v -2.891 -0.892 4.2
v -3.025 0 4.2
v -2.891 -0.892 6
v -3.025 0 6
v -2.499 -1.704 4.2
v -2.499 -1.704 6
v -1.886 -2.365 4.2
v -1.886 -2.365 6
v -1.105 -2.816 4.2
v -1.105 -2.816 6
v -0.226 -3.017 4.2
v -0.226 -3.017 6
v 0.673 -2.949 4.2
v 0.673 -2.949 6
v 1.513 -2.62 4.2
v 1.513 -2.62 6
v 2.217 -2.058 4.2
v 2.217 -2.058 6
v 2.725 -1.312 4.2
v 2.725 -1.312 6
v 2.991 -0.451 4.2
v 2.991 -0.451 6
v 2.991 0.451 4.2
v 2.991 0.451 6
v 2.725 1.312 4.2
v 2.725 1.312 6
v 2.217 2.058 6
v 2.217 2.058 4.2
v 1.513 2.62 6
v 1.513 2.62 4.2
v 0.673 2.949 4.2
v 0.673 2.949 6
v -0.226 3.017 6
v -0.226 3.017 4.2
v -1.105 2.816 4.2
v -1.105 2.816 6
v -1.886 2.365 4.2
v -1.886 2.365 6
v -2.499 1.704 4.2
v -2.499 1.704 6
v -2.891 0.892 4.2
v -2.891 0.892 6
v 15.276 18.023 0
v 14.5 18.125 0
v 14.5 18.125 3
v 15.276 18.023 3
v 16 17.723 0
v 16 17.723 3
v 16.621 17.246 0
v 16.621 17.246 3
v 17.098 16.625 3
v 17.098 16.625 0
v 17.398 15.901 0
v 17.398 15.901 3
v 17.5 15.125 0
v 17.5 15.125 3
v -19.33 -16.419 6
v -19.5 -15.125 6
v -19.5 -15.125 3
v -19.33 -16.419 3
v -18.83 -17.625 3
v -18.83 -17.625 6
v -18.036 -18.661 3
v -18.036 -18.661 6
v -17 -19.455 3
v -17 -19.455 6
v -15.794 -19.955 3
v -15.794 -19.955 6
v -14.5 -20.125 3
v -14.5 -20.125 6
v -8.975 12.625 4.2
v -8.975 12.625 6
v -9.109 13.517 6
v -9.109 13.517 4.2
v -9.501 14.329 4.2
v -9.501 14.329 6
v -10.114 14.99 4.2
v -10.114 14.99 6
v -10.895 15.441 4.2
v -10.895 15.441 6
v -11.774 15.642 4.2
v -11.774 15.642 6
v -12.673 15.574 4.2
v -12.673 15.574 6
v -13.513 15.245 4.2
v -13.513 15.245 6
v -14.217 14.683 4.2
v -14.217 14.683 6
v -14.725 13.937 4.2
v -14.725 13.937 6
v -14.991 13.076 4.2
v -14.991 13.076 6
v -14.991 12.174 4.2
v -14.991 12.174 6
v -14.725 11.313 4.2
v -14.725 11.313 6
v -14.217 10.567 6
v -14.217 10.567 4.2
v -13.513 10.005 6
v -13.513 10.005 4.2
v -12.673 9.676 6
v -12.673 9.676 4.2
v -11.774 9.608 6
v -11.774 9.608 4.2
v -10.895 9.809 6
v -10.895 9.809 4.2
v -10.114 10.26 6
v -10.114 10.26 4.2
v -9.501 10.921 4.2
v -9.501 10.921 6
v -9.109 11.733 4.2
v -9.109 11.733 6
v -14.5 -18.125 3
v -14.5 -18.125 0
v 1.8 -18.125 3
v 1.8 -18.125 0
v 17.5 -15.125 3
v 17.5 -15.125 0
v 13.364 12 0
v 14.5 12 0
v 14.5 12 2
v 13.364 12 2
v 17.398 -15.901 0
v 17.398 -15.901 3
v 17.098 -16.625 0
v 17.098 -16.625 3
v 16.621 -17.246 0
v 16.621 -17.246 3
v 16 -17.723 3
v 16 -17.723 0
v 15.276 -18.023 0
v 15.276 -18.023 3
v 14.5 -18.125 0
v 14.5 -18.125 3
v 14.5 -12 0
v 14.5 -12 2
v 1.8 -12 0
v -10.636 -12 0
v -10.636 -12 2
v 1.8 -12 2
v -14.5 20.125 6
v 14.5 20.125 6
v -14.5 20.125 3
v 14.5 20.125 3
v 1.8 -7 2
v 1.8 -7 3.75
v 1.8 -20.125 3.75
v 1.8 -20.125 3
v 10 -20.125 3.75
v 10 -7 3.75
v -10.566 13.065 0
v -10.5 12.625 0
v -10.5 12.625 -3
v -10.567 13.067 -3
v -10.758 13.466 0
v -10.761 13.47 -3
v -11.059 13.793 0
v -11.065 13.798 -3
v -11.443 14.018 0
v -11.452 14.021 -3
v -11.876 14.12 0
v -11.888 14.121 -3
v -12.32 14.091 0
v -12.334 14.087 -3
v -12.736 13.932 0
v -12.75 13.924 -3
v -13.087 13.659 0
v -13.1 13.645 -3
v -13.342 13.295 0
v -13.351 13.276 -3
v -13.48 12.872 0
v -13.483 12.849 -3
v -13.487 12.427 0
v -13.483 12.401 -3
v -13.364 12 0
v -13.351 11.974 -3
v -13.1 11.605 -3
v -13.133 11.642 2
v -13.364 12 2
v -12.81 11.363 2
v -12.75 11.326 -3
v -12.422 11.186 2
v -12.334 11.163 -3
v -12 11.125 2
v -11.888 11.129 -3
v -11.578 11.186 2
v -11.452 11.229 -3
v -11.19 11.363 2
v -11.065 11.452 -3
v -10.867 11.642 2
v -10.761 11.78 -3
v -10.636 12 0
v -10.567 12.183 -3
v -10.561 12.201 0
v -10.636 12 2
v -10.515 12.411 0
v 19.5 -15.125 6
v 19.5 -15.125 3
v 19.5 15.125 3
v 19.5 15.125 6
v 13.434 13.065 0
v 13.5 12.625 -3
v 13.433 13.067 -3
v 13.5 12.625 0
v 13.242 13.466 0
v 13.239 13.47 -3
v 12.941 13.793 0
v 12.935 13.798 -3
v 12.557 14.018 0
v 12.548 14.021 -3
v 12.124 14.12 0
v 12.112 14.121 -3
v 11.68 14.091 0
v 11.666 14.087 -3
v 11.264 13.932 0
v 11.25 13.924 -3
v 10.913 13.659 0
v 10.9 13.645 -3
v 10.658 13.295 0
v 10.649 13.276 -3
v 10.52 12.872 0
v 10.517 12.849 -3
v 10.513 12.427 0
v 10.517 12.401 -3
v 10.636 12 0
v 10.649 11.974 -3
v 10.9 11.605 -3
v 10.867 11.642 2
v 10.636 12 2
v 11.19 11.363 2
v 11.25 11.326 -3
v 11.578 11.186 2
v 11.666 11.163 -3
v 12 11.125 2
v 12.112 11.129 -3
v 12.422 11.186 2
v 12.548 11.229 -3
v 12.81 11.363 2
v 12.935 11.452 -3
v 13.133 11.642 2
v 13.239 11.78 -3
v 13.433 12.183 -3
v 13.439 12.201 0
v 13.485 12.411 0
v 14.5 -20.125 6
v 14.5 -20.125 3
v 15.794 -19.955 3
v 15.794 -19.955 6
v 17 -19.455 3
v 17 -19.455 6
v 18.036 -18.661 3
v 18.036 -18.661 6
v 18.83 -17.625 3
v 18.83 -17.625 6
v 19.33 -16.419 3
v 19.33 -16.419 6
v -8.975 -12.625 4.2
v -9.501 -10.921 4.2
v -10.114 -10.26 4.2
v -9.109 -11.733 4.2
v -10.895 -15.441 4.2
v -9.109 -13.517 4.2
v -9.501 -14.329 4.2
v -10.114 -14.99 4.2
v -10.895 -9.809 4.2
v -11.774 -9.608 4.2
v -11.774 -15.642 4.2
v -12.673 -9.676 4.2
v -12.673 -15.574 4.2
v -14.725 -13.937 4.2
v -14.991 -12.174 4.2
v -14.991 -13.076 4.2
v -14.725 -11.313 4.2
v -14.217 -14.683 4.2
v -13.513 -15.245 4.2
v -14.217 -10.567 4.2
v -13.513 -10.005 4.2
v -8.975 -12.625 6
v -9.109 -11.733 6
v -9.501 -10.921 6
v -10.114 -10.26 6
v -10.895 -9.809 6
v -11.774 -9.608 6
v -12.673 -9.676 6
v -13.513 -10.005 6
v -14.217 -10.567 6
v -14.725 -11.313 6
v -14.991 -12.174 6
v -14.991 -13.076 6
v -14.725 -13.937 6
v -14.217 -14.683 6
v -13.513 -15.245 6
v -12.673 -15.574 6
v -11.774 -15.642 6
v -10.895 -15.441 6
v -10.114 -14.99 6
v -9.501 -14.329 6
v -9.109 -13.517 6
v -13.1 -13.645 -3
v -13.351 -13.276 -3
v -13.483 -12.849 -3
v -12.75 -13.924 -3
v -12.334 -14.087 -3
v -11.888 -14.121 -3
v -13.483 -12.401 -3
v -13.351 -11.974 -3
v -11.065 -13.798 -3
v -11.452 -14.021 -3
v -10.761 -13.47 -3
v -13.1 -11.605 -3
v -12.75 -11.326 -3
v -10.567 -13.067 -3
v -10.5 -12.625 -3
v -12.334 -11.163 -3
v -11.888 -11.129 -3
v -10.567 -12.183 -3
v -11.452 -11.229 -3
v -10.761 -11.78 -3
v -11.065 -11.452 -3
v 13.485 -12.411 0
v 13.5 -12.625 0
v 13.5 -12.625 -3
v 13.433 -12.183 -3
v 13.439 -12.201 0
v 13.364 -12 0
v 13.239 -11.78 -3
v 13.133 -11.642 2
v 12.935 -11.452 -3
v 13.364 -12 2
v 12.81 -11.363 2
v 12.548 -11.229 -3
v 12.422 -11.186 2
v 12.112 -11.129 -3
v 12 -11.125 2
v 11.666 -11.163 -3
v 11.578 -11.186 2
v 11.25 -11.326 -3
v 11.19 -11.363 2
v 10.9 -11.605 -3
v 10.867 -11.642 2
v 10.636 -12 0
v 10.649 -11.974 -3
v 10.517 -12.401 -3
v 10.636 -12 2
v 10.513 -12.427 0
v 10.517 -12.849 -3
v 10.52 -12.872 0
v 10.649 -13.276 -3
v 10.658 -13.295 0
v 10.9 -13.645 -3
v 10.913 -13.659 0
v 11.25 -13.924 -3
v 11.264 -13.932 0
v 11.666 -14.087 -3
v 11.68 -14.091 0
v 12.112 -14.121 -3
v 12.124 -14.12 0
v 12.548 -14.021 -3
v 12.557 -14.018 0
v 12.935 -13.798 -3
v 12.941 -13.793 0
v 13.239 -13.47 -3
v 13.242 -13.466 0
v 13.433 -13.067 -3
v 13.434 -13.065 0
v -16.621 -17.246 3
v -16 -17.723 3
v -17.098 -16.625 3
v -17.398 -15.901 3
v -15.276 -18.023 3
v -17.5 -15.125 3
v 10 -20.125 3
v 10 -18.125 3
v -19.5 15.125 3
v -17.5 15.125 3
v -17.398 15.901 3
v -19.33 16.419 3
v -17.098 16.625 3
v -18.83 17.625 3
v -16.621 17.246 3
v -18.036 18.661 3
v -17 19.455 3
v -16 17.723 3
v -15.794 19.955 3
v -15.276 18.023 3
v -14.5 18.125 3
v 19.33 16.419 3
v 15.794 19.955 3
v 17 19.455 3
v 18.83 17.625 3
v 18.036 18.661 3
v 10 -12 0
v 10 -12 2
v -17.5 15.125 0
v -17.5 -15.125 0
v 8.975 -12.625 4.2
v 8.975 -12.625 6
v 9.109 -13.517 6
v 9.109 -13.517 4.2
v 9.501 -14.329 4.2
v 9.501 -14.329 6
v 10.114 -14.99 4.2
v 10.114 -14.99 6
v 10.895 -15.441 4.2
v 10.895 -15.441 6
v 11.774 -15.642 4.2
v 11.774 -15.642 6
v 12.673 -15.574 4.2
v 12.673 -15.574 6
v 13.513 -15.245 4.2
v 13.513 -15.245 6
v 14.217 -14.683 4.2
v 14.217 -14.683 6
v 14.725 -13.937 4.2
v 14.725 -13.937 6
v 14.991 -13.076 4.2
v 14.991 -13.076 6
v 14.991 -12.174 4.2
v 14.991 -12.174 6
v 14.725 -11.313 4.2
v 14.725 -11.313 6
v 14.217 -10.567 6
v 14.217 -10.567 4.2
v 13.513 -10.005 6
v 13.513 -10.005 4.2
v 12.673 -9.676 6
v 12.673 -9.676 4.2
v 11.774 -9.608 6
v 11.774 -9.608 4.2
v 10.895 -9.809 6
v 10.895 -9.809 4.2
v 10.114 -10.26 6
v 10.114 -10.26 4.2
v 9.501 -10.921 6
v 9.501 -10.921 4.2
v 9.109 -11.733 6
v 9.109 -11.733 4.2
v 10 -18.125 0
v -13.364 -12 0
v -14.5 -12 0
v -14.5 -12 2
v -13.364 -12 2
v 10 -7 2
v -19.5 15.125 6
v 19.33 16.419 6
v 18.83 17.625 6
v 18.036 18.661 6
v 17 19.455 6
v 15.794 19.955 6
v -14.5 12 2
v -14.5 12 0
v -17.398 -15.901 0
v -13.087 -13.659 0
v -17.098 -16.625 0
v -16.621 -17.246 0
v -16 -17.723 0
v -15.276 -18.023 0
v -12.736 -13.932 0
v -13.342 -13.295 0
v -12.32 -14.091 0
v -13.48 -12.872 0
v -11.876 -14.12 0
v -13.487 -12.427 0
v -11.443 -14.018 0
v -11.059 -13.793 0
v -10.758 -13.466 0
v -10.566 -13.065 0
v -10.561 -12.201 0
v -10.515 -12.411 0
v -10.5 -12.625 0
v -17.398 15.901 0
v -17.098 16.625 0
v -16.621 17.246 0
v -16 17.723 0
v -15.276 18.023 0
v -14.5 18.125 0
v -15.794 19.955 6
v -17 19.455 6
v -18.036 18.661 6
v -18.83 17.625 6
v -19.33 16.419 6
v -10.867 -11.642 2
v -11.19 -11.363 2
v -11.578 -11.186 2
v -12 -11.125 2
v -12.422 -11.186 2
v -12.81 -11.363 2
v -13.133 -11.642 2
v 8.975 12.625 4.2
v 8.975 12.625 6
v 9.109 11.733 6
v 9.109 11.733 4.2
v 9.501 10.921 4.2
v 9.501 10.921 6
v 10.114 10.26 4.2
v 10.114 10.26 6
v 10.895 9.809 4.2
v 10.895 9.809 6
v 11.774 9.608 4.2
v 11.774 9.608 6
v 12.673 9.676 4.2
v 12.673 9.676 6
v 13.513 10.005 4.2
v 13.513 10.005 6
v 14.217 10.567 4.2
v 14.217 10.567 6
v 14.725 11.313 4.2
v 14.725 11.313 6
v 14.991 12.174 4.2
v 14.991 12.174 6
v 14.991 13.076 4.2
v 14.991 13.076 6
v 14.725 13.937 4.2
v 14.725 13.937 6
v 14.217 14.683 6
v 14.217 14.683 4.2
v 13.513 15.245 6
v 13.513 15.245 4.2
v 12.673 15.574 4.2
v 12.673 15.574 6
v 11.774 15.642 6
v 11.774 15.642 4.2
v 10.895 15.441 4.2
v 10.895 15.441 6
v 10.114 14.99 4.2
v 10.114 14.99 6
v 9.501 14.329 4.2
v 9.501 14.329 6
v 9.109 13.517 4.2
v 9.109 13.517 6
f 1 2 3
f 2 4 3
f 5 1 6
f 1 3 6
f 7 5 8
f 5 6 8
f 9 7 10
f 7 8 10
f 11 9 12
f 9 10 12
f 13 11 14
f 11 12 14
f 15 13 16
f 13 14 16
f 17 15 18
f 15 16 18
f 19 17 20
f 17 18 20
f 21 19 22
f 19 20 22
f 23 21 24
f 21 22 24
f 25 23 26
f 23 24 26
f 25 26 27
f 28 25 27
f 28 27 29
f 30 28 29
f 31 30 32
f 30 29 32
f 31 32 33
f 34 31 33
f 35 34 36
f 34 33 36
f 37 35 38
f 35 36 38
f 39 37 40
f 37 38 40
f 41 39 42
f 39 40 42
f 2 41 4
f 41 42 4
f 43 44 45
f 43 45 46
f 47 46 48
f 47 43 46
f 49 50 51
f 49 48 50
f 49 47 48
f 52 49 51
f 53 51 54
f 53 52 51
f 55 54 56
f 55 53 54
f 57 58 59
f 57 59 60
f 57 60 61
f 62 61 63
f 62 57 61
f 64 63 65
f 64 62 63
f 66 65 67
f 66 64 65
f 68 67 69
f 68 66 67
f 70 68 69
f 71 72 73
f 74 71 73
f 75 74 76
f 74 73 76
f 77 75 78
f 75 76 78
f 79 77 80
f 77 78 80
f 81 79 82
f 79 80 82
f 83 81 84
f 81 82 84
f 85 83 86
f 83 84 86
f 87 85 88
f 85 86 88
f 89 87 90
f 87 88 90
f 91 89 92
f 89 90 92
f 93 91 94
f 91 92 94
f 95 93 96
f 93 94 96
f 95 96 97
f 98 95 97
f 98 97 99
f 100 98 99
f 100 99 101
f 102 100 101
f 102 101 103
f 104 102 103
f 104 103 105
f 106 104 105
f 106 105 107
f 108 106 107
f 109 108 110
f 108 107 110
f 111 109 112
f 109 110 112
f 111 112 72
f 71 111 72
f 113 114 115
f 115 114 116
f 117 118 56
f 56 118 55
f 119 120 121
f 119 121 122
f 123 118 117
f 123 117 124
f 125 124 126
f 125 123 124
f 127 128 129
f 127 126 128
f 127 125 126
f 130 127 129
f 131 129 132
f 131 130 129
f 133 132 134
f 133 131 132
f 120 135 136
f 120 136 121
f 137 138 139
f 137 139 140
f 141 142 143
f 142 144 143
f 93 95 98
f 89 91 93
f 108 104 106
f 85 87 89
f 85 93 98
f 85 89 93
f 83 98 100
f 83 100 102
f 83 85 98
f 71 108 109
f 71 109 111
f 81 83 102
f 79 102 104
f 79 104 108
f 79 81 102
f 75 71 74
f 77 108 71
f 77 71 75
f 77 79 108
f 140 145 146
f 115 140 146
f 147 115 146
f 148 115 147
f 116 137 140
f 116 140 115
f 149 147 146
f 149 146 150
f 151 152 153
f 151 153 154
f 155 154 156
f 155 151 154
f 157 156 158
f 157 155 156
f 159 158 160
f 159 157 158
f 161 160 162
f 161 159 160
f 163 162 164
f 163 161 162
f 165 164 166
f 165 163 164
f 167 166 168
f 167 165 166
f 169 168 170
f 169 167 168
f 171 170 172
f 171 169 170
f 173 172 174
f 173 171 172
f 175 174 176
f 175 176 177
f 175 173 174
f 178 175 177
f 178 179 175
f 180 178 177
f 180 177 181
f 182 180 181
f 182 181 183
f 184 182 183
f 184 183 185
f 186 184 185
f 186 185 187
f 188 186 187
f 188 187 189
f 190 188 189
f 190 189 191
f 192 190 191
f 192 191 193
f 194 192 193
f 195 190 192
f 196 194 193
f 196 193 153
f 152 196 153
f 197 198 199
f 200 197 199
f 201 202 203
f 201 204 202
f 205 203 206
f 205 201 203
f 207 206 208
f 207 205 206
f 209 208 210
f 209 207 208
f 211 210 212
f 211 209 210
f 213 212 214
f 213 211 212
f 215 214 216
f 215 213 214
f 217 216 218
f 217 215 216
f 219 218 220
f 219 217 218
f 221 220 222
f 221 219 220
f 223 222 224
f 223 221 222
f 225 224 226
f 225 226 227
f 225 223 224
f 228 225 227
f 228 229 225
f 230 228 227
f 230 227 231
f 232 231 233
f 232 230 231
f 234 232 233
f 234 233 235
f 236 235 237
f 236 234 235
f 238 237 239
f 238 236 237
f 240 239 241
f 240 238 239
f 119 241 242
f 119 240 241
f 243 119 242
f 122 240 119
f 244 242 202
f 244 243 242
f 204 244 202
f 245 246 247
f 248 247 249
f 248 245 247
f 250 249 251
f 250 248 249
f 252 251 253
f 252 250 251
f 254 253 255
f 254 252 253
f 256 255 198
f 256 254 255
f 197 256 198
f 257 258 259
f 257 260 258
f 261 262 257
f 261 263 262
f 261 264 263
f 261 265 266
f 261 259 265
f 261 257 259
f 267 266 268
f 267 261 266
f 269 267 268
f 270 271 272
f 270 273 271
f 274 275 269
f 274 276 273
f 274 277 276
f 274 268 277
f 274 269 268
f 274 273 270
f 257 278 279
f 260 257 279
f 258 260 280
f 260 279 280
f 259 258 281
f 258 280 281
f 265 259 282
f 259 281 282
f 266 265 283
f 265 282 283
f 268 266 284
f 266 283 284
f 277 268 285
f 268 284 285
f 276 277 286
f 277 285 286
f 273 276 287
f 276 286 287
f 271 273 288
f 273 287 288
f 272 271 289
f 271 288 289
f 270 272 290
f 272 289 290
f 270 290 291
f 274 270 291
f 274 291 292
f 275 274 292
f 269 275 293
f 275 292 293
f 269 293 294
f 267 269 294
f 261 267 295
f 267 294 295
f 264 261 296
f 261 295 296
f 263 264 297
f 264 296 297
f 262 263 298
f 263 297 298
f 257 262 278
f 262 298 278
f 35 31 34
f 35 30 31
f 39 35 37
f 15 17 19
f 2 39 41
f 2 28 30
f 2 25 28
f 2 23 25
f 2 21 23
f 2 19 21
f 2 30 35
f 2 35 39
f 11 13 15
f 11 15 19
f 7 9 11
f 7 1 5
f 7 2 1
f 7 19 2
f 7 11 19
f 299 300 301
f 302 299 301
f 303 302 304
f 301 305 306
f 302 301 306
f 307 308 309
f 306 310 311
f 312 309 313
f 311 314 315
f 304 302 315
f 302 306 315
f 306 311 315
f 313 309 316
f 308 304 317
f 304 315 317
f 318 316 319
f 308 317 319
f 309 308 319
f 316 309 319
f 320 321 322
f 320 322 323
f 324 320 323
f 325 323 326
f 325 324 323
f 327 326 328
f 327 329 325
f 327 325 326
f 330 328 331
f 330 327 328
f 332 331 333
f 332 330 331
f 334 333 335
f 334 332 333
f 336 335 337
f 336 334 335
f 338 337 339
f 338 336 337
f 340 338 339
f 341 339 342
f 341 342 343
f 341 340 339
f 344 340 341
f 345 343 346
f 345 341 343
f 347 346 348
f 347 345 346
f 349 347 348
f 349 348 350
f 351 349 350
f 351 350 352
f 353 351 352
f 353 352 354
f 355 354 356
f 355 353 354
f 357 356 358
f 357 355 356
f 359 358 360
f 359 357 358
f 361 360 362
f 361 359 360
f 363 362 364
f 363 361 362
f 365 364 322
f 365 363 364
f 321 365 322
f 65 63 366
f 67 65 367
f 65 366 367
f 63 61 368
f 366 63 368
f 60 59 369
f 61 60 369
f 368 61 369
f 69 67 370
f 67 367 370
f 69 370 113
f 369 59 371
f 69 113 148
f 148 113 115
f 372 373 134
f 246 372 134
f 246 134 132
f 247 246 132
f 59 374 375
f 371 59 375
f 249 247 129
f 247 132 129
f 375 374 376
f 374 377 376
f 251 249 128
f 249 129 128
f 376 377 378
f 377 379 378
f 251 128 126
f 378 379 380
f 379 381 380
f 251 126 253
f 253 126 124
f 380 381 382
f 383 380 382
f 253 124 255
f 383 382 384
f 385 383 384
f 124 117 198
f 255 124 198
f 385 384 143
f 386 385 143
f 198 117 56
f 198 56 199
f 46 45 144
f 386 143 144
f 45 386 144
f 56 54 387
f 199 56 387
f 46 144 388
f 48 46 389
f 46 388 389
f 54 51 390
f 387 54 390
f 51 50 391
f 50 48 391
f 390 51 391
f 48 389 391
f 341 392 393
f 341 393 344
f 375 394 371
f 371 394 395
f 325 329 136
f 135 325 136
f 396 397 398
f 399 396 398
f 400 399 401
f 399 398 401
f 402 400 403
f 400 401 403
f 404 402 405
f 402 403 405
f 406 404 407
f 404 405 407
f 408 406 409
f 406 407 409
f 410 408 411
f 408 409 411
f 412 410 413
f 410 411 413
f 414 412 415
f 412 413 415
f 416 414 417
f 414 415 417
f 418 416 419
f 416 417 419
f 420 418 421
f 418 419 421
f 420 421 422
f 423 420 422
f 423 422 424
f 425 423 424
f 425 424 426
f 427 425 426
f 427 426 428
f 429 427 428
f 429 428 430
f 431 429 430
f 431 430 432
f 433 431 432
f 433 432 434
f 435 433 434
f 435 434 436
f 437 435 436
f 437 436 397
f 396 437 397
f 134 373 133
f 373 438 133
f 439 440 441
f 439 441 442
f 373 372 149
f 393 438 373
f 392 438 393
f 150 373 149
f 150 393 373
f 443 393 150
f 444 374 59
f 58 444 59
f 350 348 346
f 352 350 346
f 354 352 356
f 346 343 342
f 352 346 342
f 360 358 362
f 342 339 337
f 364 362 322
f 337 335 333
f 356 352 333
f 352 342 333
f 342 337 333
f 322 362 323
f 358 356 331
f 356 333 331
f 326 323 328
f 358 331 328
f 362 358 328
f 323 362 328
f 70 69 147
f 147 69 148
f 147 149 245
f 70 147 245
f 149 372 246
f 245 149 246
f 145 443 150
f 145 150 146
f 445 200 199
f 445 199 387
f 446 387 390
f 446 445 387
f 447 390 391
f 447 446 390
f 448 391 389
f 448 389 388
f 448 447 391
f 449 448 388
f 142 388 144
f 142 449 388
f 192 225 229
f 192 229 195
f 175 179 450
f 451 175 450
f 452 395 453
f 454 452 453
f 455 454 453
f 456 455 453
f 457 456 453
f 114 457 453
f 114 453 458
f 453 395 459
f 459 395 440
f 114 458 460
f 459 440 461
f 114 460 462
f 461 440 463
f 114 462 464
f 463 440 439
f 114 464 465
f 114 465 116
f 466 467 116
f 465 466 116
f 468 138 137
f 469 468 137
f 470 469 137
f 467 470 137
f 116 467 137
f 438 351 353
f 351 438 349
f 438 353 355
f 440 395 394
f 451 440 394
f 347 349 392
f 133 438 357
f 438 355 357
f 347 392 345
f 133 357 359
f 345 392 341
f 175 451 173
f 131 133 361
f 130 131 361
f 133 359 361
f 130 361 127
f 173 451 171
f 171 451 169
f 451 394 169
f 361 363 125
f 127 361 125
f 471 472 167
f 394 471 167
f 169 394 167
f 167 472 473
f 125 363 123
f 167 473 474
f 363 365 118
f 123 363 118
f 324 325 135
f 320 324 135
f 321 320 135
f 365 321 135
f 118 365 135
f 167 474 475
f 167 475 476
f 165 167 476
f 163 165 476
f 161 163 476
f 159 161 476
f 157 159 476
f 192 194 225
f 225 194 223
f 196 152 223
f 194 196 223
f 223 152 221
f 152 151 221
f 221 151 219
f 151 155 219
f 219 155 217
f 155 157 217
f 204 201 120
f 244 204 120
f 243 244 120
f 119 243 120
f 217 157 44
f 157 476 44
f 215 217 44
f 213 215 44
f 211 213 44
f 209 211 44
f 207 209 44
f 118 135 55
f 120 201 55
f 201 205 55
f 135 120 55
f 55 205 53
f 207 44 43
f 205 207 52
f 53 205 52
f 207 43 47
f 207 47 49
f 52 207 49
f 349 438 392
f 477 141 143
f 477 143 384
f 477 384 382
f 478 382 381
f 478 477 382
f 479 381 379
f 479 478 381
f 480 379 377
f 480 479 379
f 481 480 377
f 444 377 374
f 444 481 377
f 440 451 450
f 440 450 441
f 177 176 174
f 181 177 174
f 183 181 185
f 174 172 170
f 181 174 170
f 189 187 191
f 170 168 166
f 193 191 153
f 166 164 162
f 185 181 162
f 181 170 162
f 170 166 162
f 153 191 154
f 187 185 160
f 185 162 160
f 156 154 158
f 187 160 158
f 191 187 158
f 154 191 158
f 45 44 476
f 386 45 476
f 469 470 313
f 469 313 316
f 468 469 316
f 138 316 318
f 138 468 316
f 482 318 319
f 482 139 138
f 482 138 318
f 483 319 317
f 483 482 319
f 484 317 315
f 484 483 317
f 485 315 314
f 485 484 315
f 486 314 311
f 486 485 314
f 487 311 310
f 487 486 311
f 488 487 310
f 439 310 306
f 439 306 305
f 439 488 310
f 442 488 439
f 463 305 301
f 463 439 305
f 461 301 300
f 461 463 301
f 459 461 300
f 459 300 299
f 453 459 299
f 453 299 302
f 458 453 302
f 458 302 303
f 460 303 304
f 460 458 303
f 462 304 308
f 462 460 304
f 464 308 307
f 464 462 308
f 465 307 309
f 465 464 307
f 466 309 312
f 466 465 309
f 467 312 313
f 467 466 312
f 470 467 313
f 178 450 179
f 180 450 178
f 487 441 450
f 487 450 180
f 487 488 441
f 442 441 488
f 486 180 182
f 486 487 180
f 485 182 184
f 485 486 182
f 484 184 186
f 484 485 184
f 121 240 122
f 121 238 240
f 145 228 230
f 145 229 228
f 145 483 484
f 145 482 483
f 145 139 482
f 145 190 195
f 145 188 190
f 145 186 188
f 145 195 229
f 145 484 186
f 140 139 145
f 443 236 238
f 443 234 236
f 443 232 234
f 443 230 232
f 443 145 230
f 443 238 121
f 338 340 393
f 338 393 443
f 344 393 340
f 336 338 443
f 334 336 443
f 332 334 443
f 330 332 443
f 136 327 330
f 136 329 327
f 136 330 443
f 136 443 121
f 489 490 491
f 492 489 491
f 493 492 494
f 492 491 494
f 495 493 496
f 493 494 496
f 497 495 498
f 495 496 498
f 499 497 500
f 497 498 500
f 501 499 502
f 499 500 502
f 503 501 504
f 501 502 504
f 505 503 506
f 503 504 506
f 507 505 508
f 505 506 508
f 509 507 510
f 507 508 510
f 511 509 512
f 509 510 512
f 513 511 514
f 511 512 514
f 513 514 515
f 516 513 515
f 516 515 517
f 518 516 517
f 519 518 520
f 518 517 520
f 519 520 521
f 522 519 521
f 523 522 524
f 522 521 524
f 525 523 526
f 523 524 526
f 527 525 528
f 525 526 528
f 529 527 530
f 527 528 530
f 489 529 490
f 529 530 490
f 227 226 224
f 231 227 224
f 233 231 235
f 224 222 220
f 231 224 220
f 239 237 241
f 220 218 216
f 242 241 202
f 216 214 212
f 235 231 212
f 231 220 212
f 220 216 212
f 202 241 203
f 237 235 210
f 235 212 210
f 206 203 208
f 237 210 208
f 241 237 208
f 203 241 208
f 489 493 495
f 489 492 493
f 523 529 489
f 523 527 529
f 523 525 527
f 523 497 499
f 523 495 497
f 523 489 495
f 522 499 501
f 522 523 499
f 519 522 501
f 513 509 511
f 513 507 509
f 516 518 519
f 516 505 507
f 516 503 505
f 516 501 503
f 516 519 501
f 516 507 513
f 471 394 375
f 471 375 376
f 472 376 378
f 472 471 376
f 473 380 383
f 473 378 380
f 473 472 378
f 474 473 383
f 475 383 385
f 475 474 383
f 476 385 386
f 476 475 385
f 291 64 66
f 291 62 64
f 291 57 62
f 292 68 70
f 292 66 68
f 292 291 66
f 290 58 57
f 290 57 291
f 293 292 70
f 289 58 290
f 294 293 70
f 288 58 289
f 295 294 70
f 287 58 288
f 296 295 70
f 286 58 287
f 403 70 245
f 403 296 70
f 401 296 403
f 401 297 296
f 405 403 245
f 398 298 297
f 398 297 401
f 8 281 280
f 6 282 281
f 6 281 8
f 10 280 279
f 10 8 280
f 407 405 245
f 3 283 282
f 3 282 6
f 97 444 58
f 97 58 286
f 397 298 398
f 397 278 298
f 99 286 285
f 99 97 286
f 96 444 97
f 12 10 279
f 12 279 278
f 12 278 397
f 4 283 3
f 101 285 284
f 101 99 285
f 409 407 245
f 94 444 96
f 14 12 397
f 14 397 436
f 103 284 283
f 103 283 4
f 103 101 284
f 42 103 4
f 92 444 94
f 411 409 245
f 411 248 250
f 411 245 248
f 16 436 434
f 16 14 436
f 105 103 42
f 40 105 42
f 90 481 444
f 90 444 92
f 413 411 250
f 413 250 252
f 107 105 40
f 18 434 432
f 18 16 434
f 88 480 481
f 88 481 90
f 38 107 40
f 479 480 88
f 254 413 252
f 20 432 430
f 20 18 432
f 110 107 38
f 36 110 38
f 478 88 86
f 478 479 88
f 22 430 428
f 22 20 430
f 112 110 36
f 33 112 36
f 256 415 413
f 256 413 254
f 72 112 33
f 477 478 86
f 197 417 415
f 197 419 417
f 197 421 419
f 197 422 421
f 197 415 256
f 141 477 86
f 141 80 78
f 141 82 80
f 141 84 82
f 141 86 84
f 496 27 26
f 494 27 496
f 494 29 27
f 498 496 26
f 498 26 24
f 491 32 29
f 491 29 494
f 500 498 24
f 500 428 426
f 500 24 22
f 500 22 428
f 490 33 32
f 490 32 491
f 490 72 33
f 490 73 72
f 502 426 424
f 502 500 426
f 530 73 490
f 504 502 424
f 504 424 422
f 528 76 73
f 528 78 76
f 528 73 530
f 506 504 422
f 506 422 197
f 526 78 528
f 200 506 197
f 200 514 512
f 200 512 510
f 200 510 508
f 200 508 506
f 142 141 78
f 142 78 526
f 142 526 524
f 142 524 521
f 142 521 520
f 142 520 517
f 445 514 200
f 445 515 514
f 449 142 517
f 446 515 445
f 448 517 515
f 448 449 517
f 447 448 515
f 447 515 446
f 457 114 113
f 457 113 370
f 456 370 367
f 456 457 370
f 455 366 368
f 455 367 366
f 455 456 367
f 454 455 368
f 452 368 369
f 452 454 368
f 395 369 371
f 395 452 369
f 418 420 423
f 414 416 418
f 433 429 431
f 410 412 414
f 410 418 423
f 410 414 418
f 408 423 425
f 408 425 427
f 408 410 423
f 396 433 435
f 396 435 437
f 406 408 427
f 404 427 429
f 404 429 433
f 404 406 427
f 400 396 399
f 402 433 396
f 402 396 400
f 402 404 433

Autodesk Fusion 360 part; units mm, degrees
sketch "Outline camera" plane through (0, 0, 0) normal (0, 0, 1) x (1, 0, 0)
  line L0 (-6.5, 6.5) -> (-2.5981, 6.5)
  line L1 (2.5981, 6.5) -> (6.5, 6.5)
  arc A0 (6.7082, 2) -> (6.5, 2.5981) centre (0, 0) ccw
  arc A1 (2.5981, 6.5) -> (-2.5981, 6.5) centre (0, 0) ccw
  line L2 (6.7082, 2) -> (9, 2)
  line L3 (6.5, 6.5) -> (6.5, 2.5981)
  line L4 (6.5, -2.5981) -> (6.5, -6.5)
  arc A2 (9, -2) -> (9, 2) centre (9, 0) ccw
  line L5 (9, -2) -> (6.7082, -2)
  arc A3 (6.5, -2.5981) -> (6.7082, -2) centre (0, 0) ccw
  line L6 (6.5, -6.5) -> (2.5981, -6.5)
  line L7 (-2.5981, -6.5) -> (-6.5, -6.5)
  line L8 (-9, 2) -> (-6.7082, 2)
  line L9 (-6.7082, -2) -> (-9, -2)
  line L10 (-6.5, -6.5) -> (-6.5, -2.5981)
  line L11 (-6.5, 2.5981) -> (-6.5, 6.5)
  arc A4 (-9, 2) -> (-9, -2) centre (-9, 0) ccw
  arc A5 (-6.5, 2.5981) -> (-6.7082, 2) centre (0, 0) ccw
  arc A6 (-6.7082, -2) -> (-6.5, -2.5981) centre (0, 0) ccw
  arc A7 (-2.5981, -6.5) -> (2.5981, -6.5) centre (0, 0) ccw
  arc A8 (2.6926, 7) -> (-2.6926, 7) centre (0, 0) ccw
  line L12 (-7, 7) -> (-2.6926, 7)
  line L13 (-7, 2.6926) -> (-7, 7)
  arc A9 (-7, 2.6926) -> (-7.0711, 2.5) centre (0, 0) ccw
  line L14 (-9, 2.5) -> (-7.0711, 2.5)
  arc A10 (-9, 2.5) -> (-9, -2.5) centre (-9, 0) ccw
  line L15 (-7.0711, -2.5) -> (-9, -2.5)
  arc A11 (-7.0711, -2.5) -> (-7, -2.6926) centre (0, 0) ccw
  line L16 (-7, -7) -> (-7, -2.6926)
  line L17 (-2.6926, -7) -> (-7, -7)
  arc A12 (-2.6926, -7) -> (2.6926, -7) centre (0, 0) ccw
  line L18 (7, -7) -> (2.6926, -7)
  line L19 (7, -2.6926) -> (7, -7)
  arc A13 (7, -2.6926) -> (7.0711, -2.5) centre (0, 0) ccw
  line L20 (9, -2.5) -> (7.0711, -2.5)
  arc A14 (9, -2.5) -> (9, 2.5) centre (9, 0) ccw
  line L21 (7.0711, 2.5) -> (9, 2.5)
  arc A15 (7.0711, 2.5) -> (7, 2.6926) centre (0, 0) ccw
  line L22 (7, 7) -> (7, 2.6926)
  line L23 (2.6926, 7) -> (7, 7)
  dimension "d3" = 13
  dimension "d4" = 13
  dimension "d5" = 14
  dimension "d6" = 4
  dimension "d7" = 4
  dimension "d8" = 2
  dimension "d9" = 2
  dimension "d11" = 9
  dimension "d12" = 9
  dimension "d18" = -0.5
sketch "Box size" plane through (0, 0, 0) normal (0, 0, 1) x (1, 0, 0)
  line L0 (19.5, 20.125) -> (-19.5, 20.125)
  line L1 (-19.5, 20.125) -> (-19.5, -20.125)
  line L2 (-19.5, -20.125) -> (19.5, -20.125)
  line L3 (19.5, -20.125) -> (19.5, 20.125)
  line L4 (19.5, 20.125) -> (-19.5, -20.125) construction
  line L5 (-19.5, 20.125) -> (19.5, -20.125) construction
  line L6 (-14.5, -18.125) -> (14.5, -18.125)
  line L7 (17.5, -15.125) -> (17.5, 15.125)
  line L8 (14.5, 18.125) -> (-14.5, 18.125)
  line L9 (-17.5, 15.125) -> (-17.5, -15.125)
  arc A0 (17.5, 15.125) -> (14.5, 18.125) centre (14.5, 15.125) ccw
  arc A1 (-14.5, 18.125) -> (-17.5, 15.125) centre (-14.5, 15.125) ccw
  arc A2 (14.5, -18.125) -> (17.5, -15.125) centre (14.5, -15.125) ccw
  arc A3 (-17.5, -15.125) -> (-14.5, -18.125) centre (-14.5, -15.125) ccw
  dimension "d13" = 39
  dimension "d14" = 40.25
  dimension "d47" = 3
sketch "LEDs" plane through (0, 0, 0) normal (0, 0, 1) x (1, 0, 0)
  circle A0 centre (-12.5, 6) radius 2.4
  line L0 (0, 2.5) -> (0, 20)
  circle A1 centre (12.5, 6) radius 2.4
  line L1 (20, 0) -> (2.5, 0)
  circle A2 centre (-12.5, -6) radius 2.4
  circle A3 centre (12.5, -6) radius 2.4
  dimension "d15" = 4.8
  dimension "d16" = 12.5
  dimension "d17" = 6
extrude "Extrude1" add sketch "Box size" along normal blind 6 contours L0 L1 L2 L3 | L6 L7 L8 L9 A0 A1 A2 A3
sketch "Pins" plane through (0, 0, 0) normal (0, 0, 1) x (1, 0, 0)
  line L0 (12, 12.625) -> (-12, 12.625)
  line L1 (-12, 12.625) -> (-12, -12.625)
  line L2 (-12, -12.625) -> (12, -12.625)
  line L3 (12, -12.625) -> (12, 12.625)
  line L4 (12, 12.625) -> (-12, -12.625) construction
  line L5 (-12, 12.625) -> (12, -12.625) construction
  circle A0 centre (-12, -12.625) radius 1.5
  circle A1 centre (12, -12.625) radius 1.5
  circle A2 centre (12, 12.625) radius 1.5
  circle A3 centre (-12, 12.625) radius 1.5
  dimension "d35" = 24
  dimension "d36" = 25.25
  dimension "d37" = 3
extrude "Extrude4" add sketch "Pins" against normal blind 3 contours L0 L1 A3 | L0 L1 A3 | L0 L3 A2 | L0 L3 A2 | L1 L2 A0 | L1 L2 A0 | L2 L3 A1 | L2 L3 A1
fillet "Fillet2" radius 5 4 edges at (-19.5, 20.125, 3) (-19.5, -20.125, 3) (19.5, -20.125, 3) (19.5, 20.125, 3)
extrude "Extrude6" cut sketch "Box size" along normal blind 3
sketch "Sketch15" plane through (0, 0, 0) normal (0, 0, -1) x (1, 0, 0)
  circle A0 centre (-12, -12.625) radius 1.5
  circle A1 centre (-12, 12.625) radius 1.5
  circle A2 centre (12, -12.625) radius 1.5
  circle A3 centre (12, 12.625) radius 1.5
  arc A4 (-14.5, 18.125) -> (-17.5, 15.125) centre (-14.5, 15.125) ccw
  line L0 (-17.5, 15.125) -> (-17.5, -15.125)
  arc A5 (-17.5, -15.125) -> (-14.5, -18.125) centre (-14.5, -15.125) ccw
  line L1 (-14.5, -18.125) -> (14.5, -18.125)
  arc A6 (14.5, -18.125) -> (17.5, -15.125) centre (14.5, -15.125) ccw
  line L2 (17.5, -15.125) -> (17.5, 15.125)
  arc A7 (17.5, 15.125) -> (14.5, 18.125) centre (14.5, 15.125) ccw
  line L3 (14.5, 18.125) -> (-14.5, 18.125)
  line L4 (-14.5, 12) -> (14.5, 12)
  line L5 (14.5, 12) -> (14.5, -12)
  line L6 (14.5, -12) -> (-14.5, -12)
  line L7 (-14.5, -12) -> (-14.5, 12)
  line L8 (-14.5, 12) -> (14.5, -12) construction
  line L9 (14.5, 12) -> (-14.5, -12) construction
  dimension "d55" = 29
  dimension "d56" = 24
extrude "Extrude11" cut sketch "Sketch15" against normal blind 2 contours A0 A1 A2 A3 L4 L5 L6 L7
sketch "cable" plane through (0, 0, 0) normal (0, 0, -1) x (1, 0, 0)
  line L0 (-14.5, -12) -> (-13.3636, -12)
  arc A0 (-10.6364, -12) -> (-13.3636, -12) centre (-12, -12.625) ccw
  line L1 (-10.6364, -12) -> (10.6364, -12)
  arc A1 (13.3636, -12) -> (10.6364, -12) centre (12, -12.625) ccw
  line L2 (13.3636, -12) -> (14.5, -12)
  line L3 (14.5, -12) -> (14.5, 12)
  line L4 (14.5, 12) -> (13.3636, 12)
  arc A2 (10.6364, 12) -> (13.3636, 12) centre (12, 12.625) ccw
  line L5 (10.6364, 12) -> (-10.6364, 12)
  arc A3 (-13.3636, 12) -> (-10.6364, 12) centre (-12, 12.625) ccw
  line L6 (-13.3636, 12) -> (-14.5, 12)
  line L7 (-14.5, 12) -> (-14.5, -12)
  line L8 (10, 7) -> (1.8, 7)
  line L9 (1.8, 7) -> (1.8, 27)
  line L10 (1.8, 27) -> (10, 27)
  line L11 (10, 27) -> (10, 7)
  line L12 (14.5, 18.125) -> (-14.5, 18.125)
  arc A4 (-14.5, 18.125) -> (-17.5, 15.125) centre (-14.5, 15.125) ccw
  line L13 (-17.5, 15.125) -> (-17.5, -15.125)
  arc A5 (-17.5, -15.125) -> (-14.5, -18.125) centre (-14.5, -15.125) ccw
  line L14 (-14.5, -18.125) -> (14.5, -18.125)
  arc A6 (14.5, -18.125) -> (17.5, -15.125) centre (14.5, -15.125) ccw
  line L15 (17.5, -15.125) -> (17.5, 15.125)
  arc A7 (17.5, 15.125) -> (14.5, 18.125) centre (14.5, 15.125) ccw
  line L16 (13.3636, 12) -> (14.5, 12)
  line L17 (14.5, 12) -> (14.5, -12)
  line L18 (14.5, -12) -> (13.3636, -12)
  arc A8 (10.6364, -12) -> (13.3636, -12) centre (12, -12.625) ccw
  line L19 (10.6364, -12) -> (-10.6364, -12)
  arc A9 (-13.3636, -12) -> (-10.6364, -12) centre (-12, -12.625) ccw
  line L20 (-13.3636, -12) -> (-14.5, -12)
  line L21 (-14.5, -12) -> (-14.5, 12)
  line L22 (-14.5, 12) -> (-13.3636, 12)
  arc A10 (-10.6364, 12) -> (-13.3636, 12) centre (-12, 12.625) ccw
  line L23 (-10.6364, 12) -> (10.6364, 12)
  arc A11 (13.3636, 12) -> (10.6364, 12) centre (12, 12.625) ccw
  dimension "d67" = 8.2
  dimension "d68" = 2
  dimension "d69" = 20
extrude "Extrude12" cut sketch "cable" against normal blind 3.75 contours L5 L9 L11 L12 L23 | L5 L8 L9 L11 L23 | L9 L10 L11 L12
sketch "Sketch17" plane through (0, 0, 6) normal (0, 0, 1) x (-1, 0, 0)
  arc A0 (-19.5, -15.125) -> (-14.5, -20.125) centre (-14.5, -15.125) ccw
  line L0 (-14.5, -20.125) -> (14.5, -20.125)
  arc A1 (14.5, -20.125) -> (19.5, -15.125) centre (14.5, -15.125) ccw
  line L1 (19.5, -15.125) -> (19.5, 15.125)
  arc A2 (19.5, 15.125) -> (14.5, 20.125) centre (14.5, 15.125) ccw
  line L2 (14.5, 20.125) -> (-14.5, 20.125)
  arc A3 (-14.5, 20.125) -> (-19.5, 15.125) centre (-14.5, 15.125) ccw
  line L3 (-19.5, 15.125) -> (-19.5, -15.125)
  circle A4 centre (-12, 12.625) radius 3.025
  circle A5 centre (0, 0) radius 3.025
  dimension "d72" = 6.05
  dimension "d75" = 7.5
  dimension "d76" = 7.5
extrude "Extrude13" cut sketch "Sketch17" against normal blind 1.8 contours A4 | A5
mirror "Mirror1" about plane through (0, 0, 0) normal (0, 1, 0) of "Extrude13"
mirror "Mirror2" about plane through (0, 0, 0) normal (1, 0, 0) of "Extrude13", "Mirror1"
equation "d13 = 34 mm + 5 mm"
equation "d14 = 32 mm + 4 mm - 1 mm + 0.25 mm + 5 mm"
equation "d36 = 22 mm + 4 mm - 1 mm + 0.25 mm"
